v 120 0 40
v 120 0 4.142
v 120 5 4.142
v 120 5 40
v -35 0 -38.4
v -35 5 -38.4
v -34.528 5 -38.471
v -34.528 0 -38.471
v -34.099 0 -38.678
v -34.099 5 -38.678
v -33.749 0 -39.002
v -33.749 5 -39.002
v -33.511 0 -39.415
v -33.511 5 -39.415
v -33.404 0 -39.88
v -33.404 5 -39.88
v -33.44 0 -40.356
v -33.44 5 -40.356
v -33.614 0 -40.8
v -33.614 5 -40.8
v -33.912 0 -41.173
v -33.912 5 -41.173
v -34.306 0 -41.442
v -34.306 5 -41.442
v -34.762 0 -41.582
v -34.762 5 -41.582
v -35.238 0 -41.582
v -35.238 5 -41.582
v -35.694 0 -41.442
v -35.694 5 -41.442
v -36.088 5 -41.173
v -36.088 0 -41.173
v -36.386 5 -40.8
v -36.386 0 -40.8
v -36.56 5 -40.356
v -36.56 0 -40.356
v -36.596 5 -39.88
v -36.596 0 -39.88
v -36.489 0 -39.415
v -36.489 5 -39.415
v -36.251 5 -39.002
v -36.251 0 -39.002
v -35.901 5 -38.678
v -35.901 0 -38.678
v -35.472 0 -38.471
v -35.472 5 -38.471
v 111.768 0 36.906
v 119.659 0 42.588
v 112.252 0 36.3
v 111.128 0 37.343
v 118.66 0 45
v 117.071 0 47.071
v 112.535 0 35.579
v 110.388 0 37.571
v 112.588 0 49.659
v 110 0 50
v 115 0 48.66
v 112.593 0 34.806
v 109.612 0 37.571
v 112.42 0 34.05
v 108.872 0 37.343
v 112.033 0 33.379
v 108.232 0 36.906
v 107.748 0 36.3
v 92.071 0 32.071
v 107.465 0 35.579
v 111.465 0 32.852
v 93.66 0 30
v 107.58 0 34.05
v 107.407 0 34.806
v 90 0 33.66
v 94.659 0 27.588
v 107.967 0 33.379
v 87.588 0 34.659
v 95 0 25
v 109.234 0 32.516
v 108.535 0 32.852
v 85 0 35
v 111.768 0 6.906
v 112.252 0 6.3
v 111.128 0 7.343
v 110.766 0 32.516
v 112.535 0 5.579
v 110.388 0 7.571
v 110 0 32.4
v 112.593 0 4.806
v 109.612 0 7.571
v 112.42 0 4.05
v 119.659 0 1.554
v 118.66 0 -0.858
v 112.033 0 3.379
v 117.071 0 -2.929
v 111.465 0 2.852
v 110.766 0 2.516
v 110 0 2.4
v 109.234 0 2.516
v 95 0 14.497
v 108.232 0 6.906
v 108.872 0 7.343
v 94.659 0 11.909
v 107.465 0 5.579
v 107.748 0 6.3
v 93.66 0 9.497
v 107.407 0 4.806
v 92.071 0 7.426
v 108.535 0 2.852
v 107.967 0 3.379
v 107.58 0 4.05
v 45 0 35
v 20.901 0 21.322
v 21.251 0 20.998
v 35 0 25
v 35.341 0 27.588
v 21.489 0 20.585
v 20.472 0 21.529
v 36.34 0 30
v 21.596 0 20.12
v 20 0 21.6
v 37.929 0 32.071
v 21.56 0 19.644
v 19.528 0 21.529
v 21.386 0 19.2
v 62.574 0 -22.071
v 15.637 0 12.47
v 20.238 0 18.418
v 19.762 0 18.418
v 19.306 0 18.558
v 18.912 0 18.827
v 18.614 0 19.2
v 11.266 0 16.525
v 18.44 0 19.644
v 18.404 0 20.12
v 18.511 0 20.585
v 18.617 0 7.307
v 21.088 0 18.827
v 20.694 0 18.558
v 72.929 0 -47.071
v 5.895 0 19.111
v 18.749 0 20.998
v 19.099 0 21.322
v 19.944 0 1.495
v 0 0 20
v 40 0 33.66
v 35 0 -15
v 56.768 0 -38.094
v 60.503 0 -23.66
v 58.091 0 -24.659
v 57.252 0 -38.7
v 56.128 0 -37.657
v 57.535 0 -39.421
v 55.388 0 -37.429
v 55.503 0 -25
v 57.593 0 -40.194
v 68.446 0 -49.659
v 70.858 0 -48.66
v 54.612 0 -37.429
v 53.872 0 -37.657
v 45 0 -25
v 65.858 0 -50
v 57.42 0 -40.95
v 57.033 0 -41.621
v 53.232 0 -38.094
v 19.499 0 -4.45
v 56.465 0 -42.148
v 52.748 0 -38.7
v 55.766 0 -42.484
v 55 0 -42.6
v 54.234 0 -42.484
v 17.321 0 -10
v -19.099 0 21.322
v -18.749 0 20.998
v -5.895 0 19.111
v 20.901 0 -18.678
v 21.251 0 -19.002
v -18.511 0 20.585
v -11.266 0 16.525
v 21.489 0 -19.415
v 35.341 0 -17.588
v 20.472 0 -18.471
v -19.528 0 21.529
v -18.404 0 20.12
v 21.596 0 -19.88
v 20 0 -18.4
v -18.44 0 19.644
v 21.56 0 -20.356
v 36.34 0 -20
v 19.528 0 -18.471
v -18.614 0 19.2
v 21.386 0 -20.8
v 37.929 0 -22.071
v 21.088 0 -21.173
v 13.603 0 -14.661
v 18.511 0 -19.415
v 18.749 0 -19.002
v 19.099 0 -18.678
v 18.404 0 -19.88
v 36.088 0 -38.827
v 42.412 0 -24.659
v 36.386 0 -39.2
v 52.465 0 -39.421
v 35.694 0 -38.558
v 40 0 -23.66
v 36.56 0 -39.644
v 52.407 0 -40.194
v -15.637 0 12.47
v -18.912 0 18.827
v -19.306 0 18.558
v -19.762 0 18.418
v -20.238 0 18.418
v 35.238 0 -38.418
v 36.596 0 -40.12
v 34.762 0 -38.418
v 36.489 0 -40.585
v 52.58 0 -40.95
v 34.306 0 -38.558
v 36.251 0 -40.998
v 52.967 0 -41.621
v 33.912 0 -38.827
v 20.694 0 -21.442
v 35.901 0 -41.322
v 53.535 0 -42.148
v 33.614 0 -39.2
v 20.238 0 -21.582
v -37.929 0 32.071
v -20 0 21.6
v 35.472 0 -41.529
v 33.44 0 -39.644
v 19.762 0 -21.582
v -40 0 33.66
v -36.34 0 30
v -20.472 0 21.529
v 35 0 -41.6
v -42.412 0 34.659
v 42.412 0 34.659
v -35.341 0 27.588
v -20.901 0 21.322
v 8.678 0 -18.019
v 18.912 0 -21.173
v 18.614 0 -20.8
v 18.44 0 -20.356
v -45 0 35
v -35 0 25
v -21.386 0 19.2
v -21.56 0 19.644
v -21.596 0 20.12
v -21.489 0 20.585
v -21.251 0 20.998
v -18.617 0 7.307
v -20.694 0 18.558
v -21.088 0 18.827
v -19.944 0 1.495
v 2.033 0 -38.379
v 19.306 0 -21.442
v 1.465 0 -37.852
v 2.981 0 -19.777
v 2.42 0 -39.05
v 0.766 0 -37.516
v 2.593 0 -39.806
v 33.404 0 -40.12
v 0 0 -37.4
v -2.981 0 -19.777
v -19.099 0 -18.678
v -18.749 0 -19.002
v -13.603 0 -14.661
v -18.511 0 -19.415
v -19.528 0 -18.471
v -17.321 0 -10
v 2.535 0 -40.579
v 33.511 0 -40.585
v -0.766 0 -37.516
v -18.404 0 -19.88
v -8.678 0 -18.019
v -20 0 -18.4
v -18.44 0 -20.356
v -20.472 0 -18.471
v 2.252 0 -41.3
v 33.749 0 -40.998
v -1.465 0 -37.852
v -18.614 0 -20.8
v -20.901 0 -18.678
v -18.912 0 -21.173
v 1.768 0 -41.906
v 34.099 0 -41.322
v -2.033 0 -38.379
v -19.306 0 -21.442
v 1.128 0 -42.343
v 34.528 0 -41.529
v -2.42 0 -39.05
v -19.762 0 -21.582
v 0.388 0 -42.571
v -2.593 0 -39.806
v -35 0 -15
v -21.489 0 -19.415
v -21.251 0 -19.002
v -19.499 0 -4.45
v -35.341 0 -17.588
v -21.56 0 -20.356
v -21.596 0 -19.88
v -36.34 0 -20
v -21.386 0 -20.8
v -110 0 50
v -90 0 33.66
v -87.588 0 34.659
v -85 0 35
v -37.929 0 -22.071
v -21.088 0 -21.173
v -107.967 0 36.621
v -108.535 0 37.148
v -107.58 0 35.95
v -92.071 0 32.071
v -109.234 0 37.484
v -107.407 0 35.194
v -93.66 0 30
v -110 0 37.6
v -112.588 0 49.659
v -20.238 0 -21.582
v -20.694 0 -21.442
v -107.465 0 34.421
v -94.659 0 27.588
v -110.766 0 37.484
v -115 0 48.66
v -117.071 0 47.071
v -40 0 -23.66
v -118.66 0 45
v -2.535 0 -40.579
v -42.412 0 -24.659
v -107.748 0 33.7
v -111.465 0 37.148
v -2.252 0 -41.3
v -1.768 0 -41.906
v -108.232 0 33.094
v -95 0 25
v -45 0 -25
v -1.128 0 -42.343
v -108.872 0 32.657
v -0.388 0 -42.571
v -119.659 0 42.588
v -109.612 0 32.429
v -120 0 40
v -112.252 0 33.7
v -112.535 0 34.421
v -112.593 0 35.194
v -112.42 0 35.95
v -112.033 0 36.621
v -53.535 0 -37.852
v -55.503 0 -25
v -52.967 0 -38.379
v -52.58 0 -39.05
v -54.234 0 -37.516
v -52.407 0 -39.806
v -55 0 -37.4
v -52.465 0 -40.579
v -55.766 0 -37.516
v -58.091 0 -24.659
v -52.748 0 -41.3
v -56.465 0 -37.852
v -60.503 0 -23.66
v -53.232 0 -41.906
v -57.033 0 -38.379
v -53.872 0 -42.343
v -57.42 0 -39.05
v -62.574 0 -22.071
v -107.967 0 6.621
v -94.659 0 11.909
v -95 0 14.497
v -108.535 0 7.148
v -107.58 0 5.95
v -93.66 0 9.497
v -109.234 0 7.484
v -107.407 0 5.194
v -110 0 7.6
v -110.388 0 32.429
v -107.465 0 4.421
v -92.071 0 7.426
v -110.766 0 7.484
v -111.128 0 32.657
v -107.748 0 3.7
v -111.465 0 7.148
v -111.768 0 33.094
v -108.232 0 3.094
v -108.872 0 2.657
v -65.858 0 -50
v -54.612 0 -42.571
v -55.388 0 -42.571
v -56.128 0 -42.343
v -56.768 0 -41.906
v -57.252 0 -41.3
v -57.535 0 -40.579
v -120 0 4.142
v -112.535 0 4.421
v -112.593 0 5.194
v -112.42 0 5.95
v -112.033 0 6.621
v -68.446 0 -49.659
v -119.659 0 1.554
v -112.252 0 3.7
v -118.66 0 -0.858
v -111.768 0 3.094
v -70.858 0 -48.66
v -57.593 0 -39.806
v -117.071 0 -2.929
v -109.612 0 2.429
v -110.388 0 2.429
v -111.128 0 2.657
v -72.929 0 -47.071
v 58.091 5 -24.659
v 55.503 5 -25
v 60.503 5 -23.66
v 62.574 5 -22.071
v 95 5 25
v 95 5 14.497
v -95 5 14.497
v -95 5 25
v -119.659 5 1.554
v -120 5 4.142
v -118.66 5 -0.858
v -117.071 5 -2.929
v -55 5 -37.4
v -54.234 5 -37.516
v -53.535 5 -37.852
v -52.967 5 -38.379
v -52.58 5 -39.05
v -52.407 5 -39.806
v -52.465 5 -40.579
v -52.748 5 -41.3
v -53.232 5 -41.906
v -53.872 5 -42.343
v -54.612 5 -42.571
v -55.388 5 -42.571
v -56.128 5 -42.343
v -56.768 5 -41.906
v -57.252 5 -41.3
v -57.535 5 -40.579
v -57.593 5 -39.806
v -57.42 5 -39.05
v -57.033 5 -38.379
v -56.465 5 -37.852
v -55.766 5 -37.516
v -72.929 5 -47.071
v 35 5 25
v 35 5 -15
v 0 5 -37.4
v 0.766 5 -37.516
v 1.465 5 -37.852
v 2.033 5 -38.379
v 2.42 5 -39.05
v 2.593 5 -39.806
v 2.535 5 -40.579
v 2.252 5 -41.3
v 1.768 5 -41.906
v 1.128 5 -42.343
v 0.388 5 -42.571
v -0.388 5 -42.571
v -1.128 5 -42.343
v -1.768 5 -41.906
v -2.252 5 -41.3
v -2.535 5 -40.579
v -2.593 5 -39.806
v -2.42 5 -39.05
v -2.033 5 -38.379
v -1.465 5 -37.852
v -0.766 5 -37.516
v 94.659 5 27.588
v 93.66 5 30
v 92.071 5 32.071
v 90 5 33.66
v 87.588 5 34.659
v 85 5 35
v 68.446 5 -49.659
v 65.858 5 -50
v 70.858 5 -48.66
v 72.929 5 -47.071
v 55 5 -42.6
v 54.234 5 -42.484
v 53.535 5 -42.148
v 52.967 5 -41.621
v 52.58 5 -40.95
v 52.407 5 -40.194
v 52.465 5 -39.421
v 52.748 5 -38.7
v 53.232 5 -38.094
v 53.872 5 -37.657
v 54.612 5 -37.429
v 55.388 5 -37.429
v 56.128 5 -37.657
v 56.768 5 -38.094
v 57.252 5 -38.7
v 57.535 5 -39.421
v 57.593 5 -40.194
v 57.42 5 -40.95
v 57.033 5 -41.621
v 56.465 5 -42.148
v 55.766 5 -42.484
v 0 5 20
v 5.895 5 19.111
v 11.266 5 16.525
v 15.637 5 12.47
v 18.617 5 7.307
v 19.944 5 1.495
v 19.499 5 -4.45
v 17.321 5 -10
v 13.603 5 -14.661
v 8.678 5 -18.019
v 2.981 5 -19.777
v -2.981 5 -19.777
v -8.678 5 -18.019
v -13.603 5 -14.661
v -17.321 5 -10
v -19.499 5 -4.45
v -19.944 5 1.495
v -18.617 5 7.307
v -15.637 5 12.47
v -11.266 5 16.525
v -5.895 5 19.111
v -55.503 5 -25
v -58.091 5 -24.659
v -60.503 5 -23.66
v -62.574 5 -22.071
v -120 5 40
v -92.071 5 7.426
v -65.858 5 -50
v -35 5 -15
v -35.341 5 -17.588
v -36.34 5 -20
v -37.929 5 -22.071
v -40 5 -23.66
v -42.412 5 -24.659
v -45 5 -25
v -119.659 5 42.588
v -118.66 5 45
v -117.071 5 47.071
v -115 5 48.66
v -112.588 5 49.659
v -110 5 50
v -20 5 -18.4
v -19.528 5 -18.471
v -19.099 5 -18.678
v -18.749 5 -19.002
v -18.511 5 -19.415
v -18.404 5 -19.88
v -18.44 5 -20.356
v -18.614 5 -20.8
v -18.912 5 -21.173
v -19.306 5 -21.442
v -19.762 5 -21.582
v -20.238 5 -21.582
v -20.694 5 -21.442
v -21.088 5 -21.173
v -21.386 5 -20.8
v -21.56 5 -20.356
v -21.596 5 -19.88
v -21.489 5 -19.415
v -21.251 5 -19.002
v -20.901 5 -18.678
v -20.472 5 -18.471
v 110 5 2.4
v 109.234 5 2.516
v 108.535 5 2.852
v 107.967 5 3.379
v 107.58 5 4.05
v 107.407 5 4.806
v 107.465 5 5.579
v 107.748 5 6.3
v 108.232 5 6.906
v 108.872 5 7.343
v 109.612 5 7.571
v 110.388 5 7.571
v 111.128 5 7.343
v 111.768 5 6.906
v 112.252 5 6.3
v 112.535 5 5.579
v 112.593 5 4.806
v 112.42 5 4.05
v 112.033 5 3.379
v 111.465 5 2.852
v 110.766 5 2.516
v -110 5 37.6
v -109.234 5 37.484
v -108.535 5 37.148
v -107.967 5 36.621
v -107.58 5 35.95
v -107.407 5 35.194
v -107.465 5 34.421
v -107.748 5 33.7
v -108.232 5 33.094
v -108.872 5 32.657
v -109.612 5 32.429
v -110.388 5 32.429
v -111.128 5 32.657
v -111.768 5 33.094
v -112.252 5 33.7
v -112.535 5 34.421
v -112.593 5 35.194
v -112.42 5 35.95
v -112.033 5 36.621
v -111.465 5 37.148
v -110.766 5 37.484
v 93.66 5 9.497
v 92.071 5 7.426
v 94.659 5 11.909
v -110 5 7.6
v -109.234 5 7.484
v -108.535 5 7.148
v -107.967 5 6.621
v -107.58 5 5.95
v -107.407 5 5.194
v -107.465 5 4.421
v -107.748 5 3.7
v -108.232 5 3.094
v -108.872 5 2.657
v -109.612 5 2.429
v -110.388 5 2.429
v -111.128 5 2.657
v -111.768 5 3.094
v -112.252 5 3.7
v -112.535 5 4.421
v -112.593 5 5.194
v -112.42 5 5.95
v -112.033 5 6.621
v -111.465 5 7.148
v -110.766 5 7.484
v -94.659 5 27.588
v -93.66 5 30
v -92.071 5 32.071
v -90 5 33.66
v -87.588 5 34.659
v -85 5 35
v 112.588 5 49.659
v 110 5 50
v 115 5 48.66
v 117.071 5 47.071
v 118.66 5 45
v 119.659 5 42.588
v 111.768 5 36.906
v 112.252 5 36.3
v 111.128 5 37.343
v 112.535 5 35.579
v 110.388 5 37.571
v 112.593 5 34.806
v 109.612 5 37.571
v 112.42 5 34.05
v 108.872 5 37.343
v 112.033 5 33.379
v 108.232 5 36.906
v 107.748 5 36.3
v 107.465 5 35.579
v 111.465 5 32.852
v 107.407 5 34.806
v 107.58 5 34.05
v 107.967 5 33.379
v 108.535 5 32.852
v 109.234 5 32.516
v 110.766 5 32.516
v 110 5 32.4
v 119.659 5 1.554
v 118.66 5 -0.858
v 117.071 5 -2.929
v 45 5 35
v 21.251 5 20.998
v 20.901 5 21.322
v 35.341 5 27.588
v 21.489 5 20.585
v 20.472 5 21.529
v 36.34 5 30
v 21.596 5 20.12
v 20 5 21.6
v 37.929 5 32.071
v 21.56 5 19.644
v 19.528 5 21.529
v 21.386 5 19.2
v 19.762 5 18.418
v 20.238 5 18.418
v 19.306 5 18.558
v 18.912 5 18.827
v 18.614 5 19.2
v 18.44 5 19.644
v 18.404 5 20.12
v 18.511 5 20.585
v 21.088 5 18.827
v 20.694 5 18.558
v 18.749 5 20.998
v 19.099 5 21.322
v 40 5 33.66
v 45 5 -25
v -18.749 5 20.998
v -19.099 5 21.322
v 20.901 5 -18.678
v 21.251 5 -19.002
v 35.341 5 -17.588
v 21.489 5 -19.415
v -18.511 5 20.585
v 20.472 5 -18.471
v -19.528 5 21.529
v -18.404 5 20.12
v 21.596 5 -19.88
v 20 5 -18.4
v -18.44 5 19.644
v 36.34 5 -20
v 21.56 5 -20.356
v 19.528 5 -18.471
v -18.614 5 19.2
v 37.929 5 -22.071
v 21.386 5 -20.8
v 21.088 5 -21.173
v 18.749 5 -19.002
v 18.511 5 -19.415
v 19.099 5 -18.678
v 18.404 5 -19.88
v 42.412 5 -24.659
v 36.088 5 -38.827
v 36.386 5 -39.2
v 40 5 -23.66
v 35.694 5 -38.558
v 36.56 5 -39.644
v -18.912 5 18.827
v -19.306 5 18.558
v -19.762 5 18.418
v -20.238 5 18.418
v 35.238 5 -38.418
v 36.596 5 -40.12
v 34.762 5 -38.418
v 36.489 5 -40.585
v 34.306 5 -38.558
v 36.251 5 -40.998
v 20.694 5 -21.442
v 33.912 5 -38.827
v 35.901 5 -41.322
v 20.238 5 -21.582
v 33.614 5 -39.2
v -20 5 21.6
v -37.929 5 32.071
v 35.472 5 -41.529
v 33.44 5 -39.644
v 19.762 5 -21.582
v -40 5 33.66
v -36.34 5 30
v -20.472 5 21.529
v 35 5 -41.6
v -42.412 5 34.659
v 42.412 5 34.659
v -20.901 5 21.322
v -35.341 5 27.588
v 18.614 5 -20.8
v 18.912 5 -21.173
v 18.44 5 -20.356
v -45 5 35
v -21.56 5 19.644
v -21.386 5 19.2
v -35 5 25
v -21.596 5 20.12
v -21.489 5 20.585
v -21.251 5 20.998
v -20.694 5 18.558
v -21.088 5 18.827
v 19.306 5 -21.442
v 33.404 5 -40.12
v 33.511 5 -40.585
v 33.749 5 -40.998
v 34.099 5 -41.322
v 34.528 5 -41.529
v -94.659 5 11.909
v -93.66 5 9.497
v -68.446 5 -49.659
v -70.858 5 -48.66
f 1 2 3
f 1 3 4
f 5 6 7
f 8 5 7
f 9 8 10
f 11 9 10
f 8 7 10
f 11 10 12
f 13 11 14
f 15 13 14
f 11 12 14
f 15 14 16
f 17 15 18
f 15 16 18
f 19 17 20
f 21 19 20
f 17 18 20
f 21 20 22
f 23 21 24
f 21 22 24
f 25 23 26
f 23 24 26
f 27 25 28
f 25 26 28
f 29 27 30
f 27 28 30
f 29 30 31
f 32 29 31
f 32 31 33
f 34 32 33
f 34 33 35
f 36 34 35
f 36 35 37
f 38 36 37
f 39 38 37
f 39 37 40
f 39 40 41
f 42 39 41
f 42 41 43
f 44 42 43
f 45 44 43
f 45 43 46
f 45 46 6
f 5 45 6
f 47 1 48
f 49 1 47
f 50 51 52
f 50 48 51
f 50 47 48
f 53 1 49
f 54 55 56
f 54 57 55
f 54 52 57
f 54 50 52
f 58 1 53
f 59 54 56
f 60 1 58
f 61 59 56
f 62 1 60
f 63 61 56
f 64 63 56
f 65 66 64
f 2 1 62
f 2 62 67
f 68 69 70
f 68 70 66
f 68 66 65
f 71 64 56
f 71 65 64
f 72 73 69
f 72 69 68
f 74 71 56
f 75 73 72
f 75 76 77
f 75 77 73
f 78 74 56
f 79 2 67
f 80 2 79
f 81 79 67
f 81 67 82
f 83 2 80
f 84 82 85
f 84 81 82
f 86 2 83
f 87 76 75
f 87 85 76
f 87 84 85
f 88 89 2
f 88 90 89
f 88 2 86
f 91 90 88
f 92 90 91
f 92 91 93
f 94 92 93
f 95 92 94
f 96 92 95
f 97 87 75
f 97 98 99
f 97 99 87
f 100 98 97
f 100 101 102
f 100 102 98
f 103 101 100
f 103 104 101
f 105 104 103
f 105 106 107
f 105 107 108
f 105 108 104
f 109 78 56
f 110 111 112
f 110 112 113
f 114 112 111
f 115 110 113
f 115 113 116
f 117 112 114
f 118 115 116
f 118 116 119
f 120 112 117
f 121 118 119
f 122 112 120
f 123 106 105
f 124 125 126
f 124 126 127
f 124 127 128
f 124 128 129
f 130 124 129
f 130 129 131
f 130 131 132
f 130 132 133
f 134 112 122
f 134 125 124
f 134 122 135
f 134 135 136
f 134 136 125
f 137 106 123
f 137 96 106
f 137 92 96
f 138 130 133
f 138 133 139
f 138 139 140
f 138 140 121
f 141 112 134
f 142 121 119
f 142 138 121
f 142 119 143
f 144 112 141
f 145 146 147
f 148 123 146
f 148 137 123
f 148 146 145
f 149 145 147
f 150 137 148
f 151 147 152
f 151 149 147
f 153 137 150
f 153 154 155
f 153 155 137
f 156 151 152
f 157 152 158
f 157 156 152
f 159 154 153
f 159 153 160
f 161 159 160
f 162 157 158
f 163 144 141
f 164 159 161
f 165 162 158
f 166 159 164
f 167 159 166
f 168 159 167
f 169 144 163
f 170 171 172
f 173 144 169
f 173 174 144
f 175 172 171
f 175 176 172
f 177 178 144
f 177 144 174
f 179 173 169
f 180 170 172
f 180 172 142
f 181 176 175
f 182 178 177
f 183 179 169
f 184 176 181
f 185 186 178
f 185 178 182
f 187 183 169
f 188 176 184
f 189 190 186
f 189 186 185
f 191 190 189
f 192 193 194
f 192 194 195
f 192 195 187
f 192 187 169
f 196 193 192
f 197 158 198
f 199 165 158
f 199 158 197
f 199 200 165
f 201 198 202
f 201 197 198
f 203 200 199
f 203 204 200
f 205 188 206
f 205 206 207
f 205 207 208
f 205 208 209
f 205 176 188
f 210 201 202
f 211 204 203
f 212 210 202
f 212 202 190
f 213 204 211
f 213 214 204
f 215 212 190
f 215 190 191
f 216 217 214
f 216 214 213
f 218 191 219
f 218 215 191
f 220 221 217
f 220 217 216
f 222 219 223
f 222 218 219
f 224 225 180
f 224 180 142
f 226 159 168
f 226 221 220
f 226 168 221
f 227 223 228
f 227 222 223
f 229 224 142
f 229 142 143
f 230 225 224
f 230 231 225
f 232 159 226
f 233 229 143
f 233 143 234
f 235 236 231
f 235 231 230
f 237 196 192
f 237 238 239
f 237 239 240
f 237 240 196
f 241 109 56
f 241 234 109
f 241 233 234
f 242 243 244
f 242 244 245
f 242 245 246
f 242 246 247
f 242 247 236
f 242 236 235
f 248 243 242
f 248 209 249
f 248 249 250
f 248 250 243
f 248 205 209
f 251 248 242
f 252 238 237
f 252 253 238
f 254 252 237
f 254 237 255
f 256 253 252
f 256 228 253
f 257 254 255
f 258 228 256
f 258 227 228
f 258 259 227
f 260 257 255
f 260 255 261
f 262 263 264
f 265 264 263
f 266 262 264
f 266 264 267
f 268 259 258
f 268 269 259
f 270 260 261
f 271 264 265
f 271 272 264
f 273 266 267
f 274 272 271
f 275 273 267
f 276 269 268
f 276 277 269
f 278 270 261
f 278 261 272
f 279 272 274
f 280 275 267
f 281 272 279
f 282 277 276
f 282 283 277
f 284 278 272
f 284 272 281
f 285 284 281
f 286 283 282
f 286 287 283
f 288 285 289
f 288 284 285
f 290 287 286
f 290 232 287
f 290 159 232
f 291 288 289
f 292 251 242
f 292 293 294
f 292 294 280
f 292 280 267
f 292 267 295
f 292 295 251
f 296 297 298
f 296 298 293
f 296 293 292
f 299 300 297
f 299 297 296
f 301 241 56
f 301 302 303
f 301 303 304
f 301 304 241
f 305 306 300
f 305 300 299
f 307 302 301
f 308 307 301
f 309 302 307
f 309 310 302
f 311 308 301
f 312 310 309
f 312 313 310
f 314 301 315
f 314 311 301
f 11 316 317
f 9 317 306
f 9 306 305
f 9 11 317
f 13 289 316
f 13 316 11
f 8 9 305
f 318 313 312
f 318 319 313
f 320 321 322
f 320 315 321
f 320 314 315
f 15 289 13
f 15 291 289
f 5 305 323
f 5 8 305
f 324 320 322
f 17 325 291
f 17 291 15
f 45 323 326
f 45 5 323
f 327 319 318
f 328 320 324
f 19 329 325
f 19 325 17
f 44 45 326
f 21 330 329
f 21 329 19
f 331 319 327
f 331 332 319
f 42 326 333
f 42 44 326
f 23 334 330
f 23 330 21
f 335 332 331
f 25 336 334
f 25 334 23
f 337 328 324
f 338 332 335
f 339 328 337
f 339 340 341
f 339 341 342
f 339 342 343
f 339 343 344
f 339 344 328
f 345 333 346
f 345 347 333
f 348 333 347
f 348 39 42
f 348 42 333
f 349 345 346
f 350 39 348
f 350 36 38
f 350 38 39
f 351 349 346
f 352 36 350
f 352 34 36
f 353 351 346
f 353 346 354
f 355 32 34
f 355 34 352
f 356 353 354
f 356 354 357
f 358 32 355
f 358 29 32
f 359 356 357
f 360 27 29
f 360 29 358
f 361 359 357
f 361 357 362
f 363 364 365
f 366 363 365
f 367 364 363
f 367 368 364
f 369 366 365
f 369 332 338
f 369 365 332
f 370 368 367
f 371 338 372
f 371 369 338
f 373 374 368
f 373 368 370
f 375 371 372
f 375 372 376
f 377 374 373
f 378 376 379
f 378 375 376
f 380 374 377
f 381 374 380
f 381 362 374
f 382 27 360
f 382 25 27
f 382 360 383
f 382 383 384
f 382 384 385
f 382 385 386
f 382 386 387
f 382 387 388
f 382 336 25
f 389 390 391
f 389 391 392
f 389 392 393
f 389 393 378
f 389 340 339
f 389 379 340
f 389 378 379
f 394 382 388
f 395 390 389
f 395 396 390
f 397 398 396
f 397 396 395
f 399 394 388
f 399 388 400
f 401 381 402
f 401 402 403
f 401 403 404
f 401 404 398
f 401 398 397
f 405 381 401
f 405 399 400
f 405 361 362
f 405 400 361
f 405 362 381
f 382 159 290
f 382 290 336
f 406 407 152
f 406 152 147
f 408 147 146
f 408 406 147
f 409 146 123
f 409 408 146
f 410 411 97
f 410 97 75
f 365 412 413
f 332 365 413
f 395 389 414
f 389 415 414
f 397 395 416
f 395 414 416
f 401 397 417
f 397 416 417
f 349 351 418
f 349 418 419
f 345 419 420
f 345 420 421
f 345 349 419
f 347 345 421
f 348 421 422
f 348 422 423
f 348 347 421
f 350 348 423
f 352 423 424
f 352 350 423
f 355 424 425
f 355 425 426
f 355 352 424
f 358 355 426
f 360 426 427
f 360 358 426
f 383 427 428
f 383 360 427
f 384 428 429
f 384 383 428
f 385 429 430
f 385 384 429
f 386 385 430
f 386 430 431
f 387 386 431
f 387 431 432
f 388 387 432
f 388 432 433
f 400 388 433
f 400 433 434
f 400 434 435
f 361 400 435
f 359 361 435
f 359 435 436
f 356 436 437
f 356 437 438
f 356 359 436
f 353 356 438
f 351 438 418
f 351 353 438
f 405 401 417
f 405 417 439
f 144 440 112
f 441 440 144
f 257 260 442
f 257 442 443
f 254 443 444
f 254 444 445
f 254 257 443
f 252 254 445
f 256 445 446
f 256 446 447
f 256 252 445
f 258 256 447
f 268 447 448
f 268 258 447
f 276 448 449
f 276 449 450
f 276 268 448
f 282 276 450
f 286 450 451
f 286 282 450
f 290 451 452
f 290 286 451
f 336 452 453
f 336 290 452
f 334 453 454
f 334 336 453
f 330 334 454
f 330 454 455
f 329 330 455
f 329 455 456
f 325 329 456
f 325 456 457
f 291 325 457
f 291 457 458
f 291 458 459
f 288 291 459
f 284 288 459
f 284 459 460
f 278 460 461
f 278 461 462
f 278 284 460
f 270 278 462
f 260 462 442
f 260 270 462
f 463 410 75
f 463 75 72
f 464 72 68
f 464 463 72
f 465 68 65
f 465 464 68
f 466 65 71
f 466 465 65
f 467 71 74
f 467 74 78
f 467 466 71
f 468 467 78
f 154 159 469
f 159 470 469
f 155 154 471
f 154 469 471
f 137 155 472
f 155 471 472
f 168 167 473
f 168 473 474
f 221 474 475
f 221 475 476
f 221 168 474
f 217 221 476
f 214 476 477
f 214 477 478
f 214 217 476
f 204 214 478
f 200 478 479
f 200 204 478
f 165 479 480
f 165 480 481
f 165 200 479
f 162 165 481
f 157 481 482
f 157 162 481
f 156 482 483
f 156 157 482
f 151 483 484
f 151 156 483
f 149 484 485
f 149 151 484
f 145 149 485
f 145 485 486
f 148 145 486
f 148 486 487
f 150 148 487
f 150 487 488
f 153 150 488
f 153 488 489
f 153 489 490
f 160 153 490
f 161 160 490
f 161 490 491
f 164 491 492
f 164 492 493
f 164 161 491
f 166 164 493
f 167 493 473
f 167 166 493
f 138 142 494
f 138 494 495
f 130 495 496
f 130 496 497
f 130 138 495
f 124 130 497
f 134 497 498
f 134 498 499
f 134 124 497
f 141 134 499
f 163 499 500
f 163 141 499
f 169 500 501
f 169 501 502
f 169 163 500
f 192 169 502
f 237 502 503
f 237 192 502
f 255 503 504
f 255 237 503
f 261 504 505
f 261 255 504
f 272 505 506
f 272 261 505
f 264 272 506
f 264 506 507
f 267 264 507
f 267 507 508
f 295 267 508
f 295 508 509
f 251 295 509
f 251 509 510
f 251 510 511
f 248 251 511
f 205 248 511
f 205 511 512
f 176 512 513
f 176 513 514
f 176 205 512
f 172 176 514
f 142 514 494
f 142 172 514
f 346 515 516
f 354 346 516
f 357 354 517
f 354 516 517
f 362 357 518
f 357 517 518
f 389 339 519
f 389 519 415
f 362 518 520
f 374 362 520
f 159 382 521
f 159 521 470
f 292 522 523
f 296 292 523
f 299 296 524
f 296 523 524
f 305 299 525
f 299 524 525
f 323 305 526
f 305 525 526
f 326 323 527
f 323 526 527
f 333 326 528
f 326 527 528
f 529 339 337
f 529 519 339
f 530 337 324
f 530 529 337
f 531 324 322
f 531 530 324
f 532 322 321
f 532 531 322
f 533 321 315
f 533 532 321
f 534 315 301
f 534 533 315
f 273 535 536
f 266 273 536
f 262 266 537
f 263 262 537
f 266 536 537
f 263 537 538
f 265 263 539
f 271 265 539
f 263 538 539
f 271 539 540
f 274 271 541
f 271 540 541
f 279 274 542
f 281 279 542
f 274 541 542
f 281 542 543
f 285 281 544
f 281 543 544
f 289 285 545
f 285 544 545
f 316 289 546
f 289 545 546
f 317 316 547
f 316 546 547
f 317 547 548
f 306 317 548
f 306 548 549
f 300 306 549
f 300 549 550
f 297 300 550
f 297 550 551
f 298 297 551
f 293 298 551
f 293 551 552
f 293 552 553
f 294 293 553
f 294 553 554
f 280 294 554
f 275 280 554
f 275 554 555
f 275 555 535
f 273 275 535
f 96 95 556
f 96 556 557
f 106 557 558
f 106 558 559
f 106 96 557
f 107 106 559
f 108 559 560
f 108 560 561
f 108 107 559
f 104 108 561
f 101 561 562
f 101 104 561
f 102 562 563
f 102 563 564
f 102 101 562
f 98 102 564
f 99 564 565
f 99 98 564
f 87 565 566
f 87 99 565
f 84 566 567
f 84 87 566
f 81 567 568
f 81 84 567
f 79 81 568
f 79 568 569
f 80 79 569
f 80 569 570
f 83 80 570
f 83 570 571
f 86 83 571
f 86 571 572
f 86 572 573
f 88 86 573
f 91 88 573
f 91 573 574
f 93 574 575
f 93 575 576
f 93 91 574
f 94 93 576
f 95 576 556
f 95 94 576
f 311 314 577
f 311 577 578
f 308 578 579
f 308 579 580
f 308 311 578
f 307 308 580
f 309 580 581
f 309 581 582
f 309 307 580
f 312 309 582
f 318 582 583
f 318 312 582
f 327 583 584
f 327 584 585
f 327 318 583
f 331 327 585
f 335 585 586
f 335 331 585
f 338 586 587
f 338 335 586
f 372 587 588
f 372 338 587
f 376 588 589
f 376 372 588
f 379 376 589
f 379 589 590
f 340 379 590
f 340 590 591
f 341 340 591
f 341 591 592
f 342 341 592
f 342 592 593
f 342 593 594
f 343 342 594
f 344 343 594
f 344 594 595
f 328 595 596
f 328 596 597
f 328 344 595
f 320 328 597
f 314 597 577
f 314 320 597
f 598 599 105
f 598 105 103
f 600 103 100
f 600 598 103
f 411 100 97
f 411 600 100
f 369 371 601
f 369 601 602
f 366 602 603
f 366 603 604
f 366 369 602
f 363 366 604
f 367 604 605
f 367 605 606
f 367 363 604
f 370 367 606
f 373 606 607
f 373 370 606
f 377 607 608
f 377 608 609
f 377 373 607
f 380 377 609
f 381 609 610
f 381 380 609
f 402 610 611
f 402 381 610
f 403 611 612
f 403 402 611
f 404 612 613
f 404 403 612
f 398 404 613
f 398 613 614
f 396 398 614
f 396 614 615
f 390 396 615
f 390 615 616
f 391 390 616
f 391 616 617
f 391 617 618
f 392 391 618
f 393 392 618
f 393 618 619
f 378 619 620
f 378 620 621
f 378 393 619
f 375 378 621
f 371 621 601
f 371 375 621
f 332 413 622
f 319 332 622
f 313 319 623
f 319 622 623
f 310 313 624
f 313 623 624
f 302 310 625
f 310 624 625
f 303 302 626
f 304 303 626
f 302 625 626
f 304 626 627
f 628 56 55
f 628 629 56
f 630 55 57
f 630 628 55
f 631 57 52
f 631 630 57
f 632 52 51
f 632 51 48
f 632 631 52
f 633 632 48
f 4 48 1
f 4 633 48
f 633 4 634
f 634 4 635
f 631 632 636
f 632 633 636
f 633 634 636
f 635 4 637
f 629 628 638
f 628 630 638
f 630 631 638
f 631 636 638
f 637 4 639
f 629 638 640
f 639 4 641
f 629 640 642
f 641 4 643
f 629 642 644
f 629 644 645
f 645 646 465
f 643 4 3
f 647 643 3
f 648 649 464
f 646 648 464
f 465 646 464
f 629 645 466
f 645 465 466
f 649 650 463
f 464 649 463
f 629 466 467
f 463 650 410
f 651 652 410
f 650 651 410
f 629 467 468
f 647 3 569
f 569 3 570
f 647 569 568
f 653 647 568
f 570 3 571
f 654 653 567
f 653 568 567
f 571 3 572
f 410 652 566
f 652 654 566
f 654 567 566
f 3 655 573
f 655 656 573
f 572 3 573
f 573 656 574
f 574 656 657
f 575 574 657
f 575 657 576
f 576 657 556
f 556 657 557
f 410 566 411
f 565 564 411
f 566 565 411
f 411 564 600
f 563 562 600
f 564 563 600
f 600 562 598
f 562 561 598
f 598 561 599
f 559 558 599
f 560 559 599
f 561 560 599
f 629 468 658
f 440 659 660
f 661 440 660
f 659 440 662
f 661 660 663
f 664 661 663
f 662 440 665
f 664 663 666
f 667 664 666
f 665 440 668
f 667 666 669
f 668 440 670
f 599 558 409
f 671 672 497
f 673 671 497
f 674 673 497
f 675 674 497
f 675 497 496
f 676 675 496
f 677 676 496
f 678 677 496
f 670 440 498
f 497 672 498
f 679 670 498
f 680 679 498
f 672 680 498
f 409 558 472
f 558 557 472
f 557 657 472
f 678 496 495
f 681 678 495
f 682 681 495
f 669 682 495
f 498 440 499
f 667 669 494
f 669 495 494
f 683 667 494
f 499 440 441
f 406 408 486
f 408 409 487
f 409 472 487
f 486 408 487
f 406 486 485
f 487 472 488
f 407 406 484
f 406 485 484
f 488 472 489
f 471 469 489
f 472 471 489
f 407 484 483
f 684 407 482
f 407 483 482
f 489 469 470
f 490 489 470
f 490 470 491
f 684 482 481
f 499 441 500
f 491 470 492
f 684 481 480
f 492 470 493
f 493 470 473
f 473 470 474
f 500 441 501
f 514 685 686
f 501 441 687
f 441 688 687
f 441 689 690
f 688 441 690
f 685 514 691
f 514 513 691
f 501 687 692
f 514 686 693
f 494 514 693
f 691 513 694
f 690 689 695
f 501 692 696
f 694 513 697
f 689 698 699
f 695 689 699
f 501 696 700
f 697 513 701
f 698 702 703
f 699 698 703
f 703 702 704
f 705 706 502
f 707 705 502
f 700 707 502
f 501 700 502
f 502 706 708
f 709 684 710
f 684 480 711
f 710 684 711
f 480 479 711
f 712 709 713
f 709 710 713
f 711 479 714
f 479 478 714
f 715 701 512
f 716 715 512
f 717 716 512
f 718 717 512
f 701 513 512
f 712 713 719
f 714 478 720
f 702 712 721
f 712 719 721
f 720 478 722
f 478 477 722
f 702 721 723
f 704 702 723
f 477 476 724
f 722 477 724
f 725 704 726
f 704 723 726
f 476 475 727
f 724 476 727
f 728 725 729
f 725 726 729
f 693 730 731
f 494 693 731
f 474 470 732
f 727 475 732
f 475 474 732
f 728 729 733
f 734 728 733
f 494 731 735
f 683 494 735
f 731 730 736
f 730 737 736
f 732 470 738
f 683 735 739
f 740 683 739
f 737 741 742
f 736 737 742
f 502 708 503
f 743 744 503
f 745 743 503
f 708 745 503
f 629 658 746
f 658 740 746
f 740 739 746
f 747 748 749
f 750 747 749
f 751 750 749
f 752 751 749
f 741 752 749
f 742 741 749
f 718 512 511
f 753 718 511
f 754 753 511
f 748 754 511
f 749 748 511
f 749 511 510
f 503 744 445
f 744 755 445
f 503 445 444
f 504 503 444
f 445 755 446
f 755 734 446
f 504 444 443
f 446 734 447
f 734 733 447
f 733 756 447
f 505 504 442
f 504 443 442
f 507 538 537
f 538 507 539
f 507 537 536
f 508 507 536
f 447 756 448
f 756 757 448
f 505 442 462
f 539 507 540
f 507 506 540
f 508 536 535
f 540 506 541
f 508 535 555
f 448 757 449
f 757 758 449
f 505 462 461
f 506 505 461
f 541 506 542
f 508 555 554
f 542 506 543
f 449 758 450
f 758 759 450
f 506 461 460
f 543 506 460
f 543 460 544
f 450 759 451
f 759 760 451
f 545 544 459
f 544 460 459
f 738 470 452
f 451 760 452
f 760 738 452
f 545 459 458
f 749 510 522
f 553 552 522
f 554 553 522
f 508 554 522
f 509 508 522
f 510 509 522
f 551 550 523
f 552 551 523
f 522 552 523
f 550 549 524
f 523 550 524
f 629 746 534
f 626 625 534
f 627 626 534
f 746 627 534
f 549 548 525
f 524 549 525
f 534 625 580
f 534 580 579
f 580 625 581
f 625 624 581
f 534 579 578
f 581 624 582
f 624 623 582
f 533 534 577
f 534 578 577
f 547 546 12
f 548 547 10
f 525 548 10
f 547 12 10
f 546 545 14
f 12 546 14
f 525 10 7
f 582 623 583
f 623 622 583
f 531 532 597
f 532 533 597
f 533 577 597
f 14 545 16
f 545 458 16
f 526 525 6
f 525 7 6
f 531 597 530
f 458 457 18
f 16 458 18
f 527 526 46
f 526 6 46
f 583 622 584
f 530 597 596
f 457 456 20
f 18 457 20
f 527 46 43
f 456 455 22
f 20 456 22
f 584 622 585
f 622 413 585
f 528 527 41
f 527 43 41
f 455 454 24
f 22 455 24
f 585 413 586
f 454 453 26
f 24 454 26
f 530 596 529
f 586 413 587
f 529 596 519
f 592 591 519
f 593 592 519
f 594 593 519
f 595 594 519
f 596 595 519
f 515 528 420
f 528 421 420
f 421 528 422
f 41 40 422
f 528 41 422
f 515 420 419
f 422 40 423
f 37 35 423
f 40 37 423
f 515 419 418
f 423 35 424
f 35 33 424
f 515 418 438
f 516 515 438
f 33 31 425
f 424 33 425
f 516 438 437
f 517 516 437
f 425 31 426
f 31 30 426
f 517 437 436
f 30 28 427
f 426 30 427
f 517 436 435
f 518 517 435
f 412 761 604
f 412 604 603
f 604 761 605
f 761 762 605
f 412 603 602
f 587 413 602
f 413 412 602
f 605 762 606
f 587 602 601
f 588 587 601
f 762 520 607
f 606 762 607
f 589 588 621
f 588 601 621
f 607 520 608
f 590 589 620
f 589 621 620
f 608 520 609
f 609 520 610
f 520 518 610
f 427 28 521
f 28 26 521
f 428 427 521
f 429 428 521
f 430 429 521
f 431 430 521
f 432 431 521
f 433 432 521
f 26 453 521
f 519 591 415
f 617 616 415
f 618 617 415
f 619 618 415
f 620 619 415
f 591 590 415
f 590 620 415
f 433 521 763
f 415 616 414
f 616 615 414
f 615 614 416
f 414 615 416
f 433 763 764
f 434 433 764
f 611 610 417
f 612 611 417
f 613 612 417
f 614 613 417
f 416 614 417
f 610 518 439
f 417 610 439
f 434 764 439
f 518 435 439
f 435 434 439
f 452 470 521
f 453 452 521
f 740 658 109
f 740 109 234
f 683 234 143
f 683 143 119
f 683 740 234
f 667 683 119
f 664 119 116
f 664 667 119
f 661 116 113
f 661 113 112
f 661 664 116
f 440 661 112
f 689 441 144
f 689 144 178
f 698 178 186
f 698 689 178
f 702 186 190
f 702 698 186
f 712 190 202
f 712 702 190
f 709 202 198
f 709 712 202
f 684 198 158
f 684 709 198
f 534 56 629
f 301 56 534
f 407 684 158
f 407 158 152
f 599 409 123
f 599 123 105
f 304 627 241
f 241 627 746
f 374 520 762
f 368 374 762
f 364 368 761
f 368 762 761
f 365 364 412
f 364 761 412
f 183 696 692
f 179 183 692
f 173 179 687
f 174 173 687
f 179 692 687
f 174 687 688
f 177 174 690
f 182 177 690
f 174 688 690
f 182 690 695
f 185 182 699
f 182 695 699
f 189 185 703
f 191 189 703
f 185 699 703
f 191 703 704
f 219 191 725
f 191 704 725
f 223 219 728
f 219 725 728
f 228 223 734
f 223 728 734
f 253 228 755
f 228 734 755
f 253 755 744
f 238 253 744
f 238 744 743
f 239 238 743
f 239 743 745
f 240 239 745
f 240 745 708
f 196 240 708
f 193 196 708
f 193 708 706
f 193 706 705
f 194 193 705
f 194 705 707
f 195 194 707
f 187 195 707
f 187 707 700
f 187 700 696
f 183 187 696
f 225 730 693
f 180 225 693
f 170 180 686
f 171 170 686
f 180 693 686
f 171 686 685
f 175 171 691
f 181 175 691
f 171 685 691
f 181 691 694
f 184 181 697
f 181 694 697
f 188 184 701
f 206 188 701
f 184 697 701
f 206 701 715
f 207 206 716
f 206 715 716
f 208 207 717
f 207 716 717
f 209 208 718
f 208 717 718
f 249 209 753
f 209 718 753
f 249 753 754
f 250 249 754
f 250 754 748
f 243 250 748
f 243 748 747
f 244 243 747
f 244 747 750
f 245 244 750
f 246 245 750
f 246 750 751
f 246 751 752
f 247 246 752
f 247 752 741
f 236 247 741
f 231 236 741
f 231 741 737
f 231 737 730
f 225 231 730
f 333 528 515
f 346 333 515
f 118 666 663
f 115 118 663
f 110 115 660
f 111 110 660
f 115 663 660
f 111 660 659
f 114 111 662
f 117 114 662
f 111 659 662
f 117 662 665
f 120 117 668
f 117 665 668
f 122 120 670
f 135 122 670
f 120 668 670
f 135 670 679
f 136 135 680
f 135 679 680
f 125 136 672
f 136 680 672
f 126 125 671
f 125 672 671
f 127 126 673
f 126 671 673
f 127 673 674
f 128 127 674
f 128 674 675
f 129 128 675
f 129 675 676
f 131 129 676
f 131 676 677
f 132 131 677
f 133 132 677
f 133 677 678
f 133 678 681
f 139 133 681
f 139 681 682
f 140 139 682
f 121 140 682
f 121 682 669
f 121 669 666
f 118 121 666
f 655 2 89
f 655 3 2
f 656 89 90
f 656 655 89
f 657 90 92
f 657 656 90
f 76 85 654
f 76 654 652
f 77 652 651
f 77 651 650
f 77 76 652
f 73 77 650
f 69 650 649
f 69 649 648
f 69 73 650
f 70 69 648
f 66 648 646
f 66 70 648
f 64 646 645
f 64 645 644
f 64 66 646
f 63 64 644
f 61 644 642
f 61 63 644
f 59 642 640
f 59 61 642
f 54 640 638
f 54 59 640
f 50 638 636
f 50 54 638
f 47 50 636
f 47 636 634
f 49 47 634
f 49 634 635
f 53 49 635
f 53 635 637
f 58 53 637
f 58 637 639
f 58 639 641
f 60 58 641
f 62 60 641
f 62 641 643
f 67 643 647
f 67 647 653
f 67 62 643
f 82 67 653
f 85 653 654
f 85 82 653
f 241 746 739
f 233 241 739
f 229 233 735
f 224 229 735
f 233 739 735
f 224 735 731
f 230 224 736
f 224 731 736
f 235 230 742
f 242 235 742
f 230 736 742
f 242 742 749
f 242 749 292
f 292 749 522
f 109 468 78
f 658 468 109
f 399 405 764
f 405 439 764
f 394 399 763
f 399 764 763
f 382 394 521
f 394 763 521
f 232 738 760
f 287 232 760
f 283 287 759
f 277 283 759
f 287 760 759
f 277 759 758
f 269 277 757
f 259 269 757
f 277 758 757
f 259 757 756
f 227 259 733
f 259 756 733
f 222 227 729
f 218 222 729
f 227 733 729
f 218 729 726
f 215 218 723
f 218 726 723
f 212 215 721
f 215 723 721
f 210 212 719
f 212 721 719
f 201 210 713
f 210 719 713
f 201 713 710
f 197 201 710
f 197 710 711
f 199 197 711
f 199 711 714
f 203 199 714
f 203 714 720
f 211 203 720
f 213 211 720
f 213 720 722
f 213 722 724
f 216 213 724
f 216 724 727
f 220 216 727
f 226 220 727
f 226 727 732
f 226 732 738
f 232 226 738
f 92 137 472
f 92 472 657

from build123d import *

# Parameters (mm, degrees)
SKETCH_1_R          = 20
SKETCH_1_R_2        = 2.6
EXTRUDE_1_DEPTH     = 5
CUT_EXTRUDE_2_DEPTH = 5
FILLET_1_R          = 10
SKETCH_3_R          = 1.6
CUT_EXTRUDE_3_DEPTH = 131.096118313
SKETCH_4_R          = 1.6
CUT_EXTRUDE_4_DEPTH = 131.096118313


with BuildPart() as part:
    # ｽｹｯﾁ1 → ﾎﾞｽ - 押し出し1 (new body)
    with BuildSketch(Plane(origin=(0, 0, 0), x_dir=(1, 0, 0), z_dir=(0, 1, 0))):
        Polygon((-120, -50), (-120, 0), (-70, 50), (70, 50), (120, 0), (120, -50), align=None)
        with Locations(Location((0, 0, 0), (0, 0, 270))):
            Circle(SKETCH_1_R, mode=Mode.SUBTRACT)
        with Locations(Location((-110, -35, 0), (0, 0, 270))):
            Circle(SKETCH_1_R_2, mode=Mode.SUBTRACT)
        with Locations(Location((-110, -5, 0), (0, 0, 270))):
            Circle(SKETCH_1_R_2, mode=Mode.SUBTRACT)
        with Locations(Location((-55, 40, 0), (0, 0, 270))):
            Circle(SKETCH_1_R_2, mode=Mode.SUBTRACT)
        with Locations(Location((0, 40, 0), (0, 0, 270))):
            Circle(SKETCH_1_R_2, mode=Mode.SUBTRACT)
        with Locations(Location((110, -35, 0), (0, 0, 90))):
            Circle(SKETCH_1_R_2, mode=Mode.SUBTRACT)
        with Locations(Location((110, -5, 0), (0, 0, 90))):
            Circle(SKETCH_1_R_2, mode=Mode.SUBTRACT)
        with Locations(Location((55, 40, 0), (0, 0, 90))):
            Circle(SKETCH_1_R_2, mode=Mode.SUBTRACT)
    extrude(amount=EXTRUDE_1_DEPTH)

    # ｽｹｯﾁ2 → ｶｯﾄ - 押し出し2 (cut)
    with BuildSketch(Plane(origin=(0, 5, 0), x_dir=(1, 0, 0), z_dir=(0, 1, 0))):
        with BuildLine():
            Line((-62.573593129, 22.071067812), (-92.071067812, -7.426406871))
            ThreePointArc((-92.071067812, -7.426406871), (-94.238795325, -10.670640359), (-95, -14.497474683))
            Line((-95, -14.497474683), (-95, -25))
            ThreePointArc((-95, -25), (-92.071067812, -32.071067812), (-85, -35))
            Line((-85, -35), (-45, -35))
            ThreePointArc((-45, -35), (-37.928932188, -32.071067812), (-35, -25))
            Line((-35, -25), (-35, 15))
            ThreePointArc((-35, 15), (-37.928932188, 22.071067812), (-45, 25))
            Line((-45, 25), (-55.502525317, 25))
            ThreePointArc((-55.502525317, 25), (-59.329359641, 24.238795325), (-62.573593129, 22.071067812))
        make_face()
        with BuildLine():
            Line((35, -25), (35, 15))
            ThreePointArc((35, 15), (37.928932188, 22.071067812), (45, 25))
            Line((45, 25), (55.502525317, 25))
            ThreePointArc((55.502525317, 25), (59.329359641, 24.238795325), (62.573593129, 22.071067812))
            Line((62.573593129, 22.071067812), (92.071067812, -7.426406871))
            ThreePointArc((92.071067812, -7.426406871), (94.238795325, -10.670640359), (95, -14.497474683))
            Line((95, -14.497474683), (95, -25))
            ThreePointArc((95, -25), (92.071067812, -32.071067812), (85, -35))
            Line((85, -35), (45, -35))
            ThreePointArc((45, -35), (37.928932188, -32.071067812), (35, -25))
        make_face()
    extrude(amount=-CUT_EXTRUDE_2_DEPTH, mode=Mode.SUBTRACT)

    # ﾌｨﾚｯﾄ1
    fillet_1_edges = [part.edges().sort_by_distance(p)[0] for p in [
        (-120, 2.5, 50),
        (-120, 2.5, 0),
        (-70, 2.5, -50),
        (70, 2.5, -50),
        (120, 2.5, 0),
        (120, 2.5, 50),
    ]]
    fillet(fillet_1_edges, radius=FILLET_1_R)

    # ｽｹｯﾁ3 → ｶｯﾄ - 押し出し3 (cut, through all)
    with BuildSketch(Plane(origin=(0, 5, 0), x_dir=(1, 0, 0), z_dir=(0, 1, 0))):
        with Locations(Location((-20, 20, 0), (0, 0, 270))):
            Circle(SKETCH_3_R)
        with Locations(Location((20, 20, 0), (0, 0, 270))):
            Circle(SKETCH_3_R)
        with Locations(Location((20, -20, 0), (0, 0, 270))):
            Circle(SKETCH_3_R)
        with Locations(Location((-20, -20, 0), (0, 0, 270))):
            Circle(SKETCH_3_R)
    extrude(amount=-CUT_EXTRUDE_3_DEPTH, mode=Mode.SUBTRACT)

    # ｽｹｯﾁ4 → ｶｯﾄ - 押し出し4 (cut, through all)
    with BuildSketch(Plane(origin=(0, 5, 0), x_dir=(1, 0, 0), z_dir=(0, 1, 0))):
        with Locations(Location((-35, 40, 0), (0, 0, 270))):
            Circle(SKETCH_4_R)
        with Locations(Location((35, 40, 0), (0, 0, 90))):
            Circle(SKETCH_4_R)
    extrude(amount=-CUT_EXTRUDE_4_DEPTH, mode=Mode.SUBTRACT)


solid = part.part
